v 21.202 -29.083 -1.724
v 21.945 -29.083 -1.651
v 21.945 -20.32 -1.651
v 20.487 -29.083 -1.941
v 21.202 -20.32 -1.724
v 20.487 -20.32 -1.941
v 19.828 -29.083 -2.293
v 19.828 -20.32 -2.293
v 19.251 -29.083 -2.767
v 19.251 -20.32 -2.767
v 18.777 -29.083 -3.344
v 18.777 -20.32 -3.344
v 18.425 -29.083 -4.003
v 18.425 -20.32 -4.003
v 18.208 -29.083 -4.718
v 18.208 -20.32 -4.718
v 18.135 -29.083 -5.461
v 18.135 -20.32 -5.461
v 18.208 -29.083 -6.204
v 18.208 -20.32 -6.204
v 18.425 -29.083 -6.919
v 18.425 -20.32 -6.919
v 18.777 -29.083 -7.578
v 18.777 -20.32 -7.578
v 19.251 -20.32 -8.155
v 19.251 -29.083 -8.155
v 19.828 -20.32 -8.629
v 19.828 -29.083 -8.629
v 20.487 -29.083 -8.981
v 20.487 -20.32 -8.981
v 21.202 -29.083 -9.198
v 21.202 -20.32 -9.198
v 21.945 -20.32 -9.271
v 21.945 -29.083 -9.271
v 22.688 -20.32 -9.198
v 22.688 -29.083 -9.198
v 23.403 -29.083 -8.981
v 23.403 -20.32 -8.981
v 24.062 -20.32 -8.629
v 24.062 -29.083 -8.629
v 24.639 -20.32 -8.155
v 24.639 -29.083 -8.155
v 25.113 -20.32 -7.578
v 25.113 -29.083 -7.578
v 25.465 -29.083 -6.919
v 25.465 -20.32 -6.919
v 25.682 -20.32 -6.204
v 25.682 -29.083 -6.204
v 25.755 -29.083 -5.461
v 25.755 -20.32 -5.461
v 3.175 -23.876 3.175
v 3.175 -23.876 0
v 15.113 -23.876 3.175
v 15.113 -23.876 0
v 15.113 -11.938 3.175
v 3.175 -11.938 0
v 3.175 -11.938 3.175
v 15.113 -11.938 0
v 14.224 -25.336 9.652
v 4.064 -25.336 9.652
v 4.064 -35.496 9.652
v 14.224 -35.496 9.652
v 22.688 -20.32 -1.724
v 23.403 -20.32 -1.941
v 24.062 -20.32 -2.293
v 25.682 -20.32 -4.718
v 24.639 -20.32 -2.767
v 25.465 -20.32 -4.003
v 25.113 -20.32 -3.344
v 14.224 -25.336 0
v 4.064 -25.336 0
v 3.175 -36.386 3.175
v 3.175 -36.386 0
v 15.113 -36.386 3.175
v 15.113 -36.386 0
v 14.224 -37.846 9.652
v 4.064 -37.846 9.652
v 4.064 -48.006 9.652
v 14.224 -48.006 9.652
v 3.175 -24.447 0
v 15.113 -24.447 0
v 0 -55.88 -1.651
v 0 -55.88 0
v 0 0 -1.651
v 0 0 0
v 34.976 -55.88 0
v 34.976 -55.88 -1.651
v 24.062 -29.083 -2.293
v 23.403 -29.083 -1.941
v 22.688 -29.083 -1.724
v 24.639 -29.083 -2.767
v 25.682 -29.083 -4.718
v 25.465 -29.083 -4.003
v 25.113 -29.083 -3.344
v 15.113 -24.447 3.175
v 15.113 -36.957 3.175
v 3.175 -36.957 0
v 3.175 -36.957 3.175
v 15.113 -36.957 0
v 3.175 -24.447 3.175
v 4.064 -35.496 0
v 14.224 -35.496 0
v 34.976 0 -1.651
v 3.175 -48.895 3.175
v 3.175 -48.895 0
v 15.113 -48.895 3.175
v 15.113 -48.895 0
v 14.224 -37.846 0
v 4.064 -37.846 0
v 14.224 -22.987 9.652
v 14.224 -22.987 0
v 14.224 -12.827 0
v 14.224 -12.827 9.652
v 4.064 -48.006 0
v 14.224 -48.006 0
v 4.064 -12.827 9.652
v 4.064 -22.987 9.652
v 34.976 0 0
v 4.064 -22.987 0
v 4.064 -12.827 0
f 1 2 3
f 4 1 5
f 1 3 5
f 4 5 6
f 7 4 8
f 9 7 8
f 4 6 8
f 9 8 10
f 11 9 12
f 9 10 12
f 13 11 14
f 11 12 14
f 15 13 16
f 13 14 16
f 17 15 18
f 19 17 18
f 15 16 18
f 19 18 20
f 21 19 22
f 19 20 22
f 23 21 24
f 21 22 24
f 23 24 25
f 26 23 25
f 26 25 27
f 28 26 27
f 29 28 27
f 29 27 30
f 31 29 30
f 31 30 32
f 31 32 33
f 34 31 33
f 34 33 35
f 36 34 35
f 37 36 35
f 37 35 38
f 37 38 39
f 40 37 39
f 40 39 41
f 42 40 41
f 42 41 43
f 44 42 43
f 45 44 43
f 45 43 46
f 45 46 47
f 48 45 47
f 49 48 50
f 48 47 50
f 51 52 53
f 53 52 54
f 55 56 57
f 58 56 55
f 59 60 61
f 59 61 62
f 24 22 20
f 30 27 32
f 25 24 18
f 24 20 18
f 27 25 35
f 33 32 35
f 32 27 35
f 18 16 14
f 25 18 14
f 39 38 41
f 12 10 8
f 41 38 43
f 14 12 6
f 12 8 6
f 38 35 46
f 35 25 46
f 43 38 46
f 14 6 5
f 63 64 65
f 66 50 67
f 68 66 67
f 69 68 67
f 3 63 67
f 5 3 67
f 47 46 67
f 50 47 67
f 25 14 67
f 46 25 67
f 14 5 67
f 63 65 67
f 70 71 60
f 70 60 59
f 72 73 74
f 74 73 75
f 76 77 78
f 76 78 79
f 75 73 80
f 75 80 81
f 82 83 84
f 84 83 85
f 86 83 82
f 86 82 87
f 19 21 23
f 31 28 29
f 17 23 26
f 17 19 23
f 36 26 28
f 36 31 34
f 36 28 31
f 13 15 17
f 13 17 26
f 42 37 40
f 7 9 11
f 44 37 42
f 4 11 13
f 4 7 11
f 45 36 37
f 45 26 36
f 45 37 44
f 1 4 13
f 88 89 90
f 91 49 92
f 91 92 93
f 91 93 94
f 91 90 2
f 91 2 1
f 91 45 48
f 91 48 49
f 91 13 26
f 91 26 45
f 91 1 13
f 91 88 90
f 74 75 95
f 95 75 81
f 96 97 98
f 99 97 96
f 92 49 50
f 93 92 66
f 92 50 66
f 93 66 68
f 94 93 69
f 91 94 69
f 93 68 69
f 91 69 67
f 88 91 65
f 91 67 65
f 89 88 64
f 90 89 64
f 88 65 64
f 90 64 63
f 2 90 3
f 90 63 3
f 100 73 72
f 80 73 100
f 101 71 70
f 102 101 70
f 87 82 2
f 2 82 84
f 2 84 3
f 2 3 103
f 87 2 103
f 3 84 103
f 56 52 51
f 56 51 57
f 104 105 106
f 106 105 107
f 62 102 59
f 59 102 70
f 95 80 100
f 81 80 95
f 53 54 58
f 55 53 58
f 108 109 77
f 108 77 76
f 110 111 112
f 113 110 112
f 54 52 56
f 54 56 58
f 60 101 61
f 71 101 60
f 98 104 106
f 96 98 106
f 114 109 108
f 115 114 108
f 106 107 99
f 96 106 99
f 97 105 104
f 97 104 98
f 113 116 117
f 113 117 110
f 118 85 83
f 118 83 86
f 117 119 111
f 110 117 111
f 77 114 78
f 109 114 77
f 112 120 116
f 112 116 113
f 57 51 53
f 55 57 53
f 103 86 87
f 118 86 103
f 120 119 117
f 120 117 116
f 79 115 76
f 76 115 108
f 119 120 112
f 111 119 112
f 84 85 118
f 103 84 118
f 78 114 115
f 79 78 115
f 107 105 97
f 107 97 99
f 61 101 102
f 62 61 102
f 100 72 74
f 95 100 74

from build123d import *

# Parameters (mm, degrees)
F0_W     = 34.9758
F0_H     = 55.88
F0_W_2   = 11.938
F0_H_2   = 11.938
F0_W_3   = 10.16
F0_H_3   = 10.16
F1_DEPTH = 1.651
F2_DEPTH = 3.175
F3_DEPTH = 9.652
F5_R     = 3.81
F6_DEPTH = 8.763


with BuildPart() as f1:
    # F0 (on Top) → F1 (new body)
    with BuildSketch(Plane.XY):
        with Locations((17.4879, -27.94)):
            Rectangle(F0_W, F0_H)
        with Locations((9.144, -42.926)):
            Rectangle(F0_W_2, F0_H_2, mode=Mode.SUBTRACT)
        with Locations((9.144, -30.4165)):
            Rectangle(F0_W_2, F0_H_2, mode=Mode.SUBTRACT)
        with Locations((9.144, -17.907)):
            Rectangle(F0_W_2, F0_H_2, mode=Mode.SUBTRACT)
        with Locations((9.144, -42.926)):
            Rectangle(F0_W_2, F0_H_2)
        with Locations((9.144, -42.926)):
            Rectangle(F0_W_3, F0_H_3, mode=Mode.SUBTRACT)
        with Locations((9.144, -17.907)):
            Rectangle(F0_W_2, F0_H_2)
        with Locations((9.144, -17.907)):
            Rectangle(F0_W_3, F0_H_3, mode=Mode.SUBTRACT)
        with Locations((9.144, -30.4165)):
            Rectangle(F0_W_2, F0_H_2)
        with Locations((9.144, -30.4165)):
            Rectangle(F0_W_3, F0_H_3, mode=Mode.SUBTRACT)
        with Locations((9.144, -30.4165)):
            Rectangle(F0_W_3, F0_H_3)
        with Locations((9.144, -17.907)):
            Rectangle(F0_W_3, F0_H_3)
        with Locations((9.144, -42.926)):
            Rectangle(F0_W_3, F0_H_3)
    extrude(amount=-F1_DEPTH)

    # F5 (on offset) → F6 (join)
    with BuildSketch(Plane.XZ.offset(20.32)):
        with Locations((21.9449549913, -5.461)):
            Circle(F5_R)
    extrude(amount=F6_DEPTH)


with BuildPart() as f2:
    # F0 (on Top) → F2 (new body)
    with BuildSketch(Plane.XY):
        with Locations((9.144, -17.907)):
            Rectangle(F0_W_2, F0_H_2)
        with Locations((9.144, -17.907)):
            Rectangle(F0_W_3, F0_H_3, mode=Mode.SUBTRACT)
        with Locations((9.144, -17.907)):
            Rectangle(F0_W_3, F0_H_3)
    extrude(amount=F2_DEPTH)


with BuildPart() as f2b:
    # F0 (on Top) → F2, piece 2 (new body)
    with BuildSketch(Plane.XY):
        with Locations((9.144, -30.4165)):
            Rectangle(F0_W_2, F0_H_2)
        with Locations((9.144, -30.4165)):
            Rectangle(F0_W_3, F0_H_3, mode=Mode.SUBTRACT)
        with Locations((9.144, -30.4165)):
            Rectangle(F0_W_3, F0_H_3)
    extrude(amount=F2_DEPTH)


with BuildPart() as f2c:
    # F0 (on Top) → F2, piece 3 (new body)
    with BuildSketch(Plane.XY):
        with Locations((9.144, -42.926)):
            Rectangle(F0_W_2, F0_H_2)
        with Locations((9.144, -42.926)):
            Rectangle(F0_W_3, F0_H_3, mode=Mode.SUBTRACT)
        with Locations((9.144, -42.926)):
            Rectangle(F0_W_3, F0_H_3)
    extrude(amount=F2_DEPTH)


with BuildPart() as f3:
    # F0 (on Top) → F3 (new body)
    with BuildSketch(Plane.XY):
        with Locations((9.144, -17.907)):
            Rectangle(F0_W_3, F0_H_3)
    extrude(amount=F3_DEPTH)


with BuildPart() as f3b:
    # F0 (on Top) → F3, piece 2 (new body)
    with BuildSketch(Plane.XY):
        with Locations((9.144, -30.4165)):
            Rectangle(F0_W_3, F0_H_3)
    extrude(amount=F3_DEPTH)


with BuildPart() as f3c:
    # F0 (on Top) → F3, piece 3 (new body)
    with BuildSketch(Plane.XY):
        with Locations((9.144, -42.926)):
            Rectangle(F0_W_3, F0_H_3)
    extrude(amount=F3_DEPTH)


solid = Compound([f1.part, f2.part, f2b.part, f2c.part, f3.part, f3b.part, f3c.part])
